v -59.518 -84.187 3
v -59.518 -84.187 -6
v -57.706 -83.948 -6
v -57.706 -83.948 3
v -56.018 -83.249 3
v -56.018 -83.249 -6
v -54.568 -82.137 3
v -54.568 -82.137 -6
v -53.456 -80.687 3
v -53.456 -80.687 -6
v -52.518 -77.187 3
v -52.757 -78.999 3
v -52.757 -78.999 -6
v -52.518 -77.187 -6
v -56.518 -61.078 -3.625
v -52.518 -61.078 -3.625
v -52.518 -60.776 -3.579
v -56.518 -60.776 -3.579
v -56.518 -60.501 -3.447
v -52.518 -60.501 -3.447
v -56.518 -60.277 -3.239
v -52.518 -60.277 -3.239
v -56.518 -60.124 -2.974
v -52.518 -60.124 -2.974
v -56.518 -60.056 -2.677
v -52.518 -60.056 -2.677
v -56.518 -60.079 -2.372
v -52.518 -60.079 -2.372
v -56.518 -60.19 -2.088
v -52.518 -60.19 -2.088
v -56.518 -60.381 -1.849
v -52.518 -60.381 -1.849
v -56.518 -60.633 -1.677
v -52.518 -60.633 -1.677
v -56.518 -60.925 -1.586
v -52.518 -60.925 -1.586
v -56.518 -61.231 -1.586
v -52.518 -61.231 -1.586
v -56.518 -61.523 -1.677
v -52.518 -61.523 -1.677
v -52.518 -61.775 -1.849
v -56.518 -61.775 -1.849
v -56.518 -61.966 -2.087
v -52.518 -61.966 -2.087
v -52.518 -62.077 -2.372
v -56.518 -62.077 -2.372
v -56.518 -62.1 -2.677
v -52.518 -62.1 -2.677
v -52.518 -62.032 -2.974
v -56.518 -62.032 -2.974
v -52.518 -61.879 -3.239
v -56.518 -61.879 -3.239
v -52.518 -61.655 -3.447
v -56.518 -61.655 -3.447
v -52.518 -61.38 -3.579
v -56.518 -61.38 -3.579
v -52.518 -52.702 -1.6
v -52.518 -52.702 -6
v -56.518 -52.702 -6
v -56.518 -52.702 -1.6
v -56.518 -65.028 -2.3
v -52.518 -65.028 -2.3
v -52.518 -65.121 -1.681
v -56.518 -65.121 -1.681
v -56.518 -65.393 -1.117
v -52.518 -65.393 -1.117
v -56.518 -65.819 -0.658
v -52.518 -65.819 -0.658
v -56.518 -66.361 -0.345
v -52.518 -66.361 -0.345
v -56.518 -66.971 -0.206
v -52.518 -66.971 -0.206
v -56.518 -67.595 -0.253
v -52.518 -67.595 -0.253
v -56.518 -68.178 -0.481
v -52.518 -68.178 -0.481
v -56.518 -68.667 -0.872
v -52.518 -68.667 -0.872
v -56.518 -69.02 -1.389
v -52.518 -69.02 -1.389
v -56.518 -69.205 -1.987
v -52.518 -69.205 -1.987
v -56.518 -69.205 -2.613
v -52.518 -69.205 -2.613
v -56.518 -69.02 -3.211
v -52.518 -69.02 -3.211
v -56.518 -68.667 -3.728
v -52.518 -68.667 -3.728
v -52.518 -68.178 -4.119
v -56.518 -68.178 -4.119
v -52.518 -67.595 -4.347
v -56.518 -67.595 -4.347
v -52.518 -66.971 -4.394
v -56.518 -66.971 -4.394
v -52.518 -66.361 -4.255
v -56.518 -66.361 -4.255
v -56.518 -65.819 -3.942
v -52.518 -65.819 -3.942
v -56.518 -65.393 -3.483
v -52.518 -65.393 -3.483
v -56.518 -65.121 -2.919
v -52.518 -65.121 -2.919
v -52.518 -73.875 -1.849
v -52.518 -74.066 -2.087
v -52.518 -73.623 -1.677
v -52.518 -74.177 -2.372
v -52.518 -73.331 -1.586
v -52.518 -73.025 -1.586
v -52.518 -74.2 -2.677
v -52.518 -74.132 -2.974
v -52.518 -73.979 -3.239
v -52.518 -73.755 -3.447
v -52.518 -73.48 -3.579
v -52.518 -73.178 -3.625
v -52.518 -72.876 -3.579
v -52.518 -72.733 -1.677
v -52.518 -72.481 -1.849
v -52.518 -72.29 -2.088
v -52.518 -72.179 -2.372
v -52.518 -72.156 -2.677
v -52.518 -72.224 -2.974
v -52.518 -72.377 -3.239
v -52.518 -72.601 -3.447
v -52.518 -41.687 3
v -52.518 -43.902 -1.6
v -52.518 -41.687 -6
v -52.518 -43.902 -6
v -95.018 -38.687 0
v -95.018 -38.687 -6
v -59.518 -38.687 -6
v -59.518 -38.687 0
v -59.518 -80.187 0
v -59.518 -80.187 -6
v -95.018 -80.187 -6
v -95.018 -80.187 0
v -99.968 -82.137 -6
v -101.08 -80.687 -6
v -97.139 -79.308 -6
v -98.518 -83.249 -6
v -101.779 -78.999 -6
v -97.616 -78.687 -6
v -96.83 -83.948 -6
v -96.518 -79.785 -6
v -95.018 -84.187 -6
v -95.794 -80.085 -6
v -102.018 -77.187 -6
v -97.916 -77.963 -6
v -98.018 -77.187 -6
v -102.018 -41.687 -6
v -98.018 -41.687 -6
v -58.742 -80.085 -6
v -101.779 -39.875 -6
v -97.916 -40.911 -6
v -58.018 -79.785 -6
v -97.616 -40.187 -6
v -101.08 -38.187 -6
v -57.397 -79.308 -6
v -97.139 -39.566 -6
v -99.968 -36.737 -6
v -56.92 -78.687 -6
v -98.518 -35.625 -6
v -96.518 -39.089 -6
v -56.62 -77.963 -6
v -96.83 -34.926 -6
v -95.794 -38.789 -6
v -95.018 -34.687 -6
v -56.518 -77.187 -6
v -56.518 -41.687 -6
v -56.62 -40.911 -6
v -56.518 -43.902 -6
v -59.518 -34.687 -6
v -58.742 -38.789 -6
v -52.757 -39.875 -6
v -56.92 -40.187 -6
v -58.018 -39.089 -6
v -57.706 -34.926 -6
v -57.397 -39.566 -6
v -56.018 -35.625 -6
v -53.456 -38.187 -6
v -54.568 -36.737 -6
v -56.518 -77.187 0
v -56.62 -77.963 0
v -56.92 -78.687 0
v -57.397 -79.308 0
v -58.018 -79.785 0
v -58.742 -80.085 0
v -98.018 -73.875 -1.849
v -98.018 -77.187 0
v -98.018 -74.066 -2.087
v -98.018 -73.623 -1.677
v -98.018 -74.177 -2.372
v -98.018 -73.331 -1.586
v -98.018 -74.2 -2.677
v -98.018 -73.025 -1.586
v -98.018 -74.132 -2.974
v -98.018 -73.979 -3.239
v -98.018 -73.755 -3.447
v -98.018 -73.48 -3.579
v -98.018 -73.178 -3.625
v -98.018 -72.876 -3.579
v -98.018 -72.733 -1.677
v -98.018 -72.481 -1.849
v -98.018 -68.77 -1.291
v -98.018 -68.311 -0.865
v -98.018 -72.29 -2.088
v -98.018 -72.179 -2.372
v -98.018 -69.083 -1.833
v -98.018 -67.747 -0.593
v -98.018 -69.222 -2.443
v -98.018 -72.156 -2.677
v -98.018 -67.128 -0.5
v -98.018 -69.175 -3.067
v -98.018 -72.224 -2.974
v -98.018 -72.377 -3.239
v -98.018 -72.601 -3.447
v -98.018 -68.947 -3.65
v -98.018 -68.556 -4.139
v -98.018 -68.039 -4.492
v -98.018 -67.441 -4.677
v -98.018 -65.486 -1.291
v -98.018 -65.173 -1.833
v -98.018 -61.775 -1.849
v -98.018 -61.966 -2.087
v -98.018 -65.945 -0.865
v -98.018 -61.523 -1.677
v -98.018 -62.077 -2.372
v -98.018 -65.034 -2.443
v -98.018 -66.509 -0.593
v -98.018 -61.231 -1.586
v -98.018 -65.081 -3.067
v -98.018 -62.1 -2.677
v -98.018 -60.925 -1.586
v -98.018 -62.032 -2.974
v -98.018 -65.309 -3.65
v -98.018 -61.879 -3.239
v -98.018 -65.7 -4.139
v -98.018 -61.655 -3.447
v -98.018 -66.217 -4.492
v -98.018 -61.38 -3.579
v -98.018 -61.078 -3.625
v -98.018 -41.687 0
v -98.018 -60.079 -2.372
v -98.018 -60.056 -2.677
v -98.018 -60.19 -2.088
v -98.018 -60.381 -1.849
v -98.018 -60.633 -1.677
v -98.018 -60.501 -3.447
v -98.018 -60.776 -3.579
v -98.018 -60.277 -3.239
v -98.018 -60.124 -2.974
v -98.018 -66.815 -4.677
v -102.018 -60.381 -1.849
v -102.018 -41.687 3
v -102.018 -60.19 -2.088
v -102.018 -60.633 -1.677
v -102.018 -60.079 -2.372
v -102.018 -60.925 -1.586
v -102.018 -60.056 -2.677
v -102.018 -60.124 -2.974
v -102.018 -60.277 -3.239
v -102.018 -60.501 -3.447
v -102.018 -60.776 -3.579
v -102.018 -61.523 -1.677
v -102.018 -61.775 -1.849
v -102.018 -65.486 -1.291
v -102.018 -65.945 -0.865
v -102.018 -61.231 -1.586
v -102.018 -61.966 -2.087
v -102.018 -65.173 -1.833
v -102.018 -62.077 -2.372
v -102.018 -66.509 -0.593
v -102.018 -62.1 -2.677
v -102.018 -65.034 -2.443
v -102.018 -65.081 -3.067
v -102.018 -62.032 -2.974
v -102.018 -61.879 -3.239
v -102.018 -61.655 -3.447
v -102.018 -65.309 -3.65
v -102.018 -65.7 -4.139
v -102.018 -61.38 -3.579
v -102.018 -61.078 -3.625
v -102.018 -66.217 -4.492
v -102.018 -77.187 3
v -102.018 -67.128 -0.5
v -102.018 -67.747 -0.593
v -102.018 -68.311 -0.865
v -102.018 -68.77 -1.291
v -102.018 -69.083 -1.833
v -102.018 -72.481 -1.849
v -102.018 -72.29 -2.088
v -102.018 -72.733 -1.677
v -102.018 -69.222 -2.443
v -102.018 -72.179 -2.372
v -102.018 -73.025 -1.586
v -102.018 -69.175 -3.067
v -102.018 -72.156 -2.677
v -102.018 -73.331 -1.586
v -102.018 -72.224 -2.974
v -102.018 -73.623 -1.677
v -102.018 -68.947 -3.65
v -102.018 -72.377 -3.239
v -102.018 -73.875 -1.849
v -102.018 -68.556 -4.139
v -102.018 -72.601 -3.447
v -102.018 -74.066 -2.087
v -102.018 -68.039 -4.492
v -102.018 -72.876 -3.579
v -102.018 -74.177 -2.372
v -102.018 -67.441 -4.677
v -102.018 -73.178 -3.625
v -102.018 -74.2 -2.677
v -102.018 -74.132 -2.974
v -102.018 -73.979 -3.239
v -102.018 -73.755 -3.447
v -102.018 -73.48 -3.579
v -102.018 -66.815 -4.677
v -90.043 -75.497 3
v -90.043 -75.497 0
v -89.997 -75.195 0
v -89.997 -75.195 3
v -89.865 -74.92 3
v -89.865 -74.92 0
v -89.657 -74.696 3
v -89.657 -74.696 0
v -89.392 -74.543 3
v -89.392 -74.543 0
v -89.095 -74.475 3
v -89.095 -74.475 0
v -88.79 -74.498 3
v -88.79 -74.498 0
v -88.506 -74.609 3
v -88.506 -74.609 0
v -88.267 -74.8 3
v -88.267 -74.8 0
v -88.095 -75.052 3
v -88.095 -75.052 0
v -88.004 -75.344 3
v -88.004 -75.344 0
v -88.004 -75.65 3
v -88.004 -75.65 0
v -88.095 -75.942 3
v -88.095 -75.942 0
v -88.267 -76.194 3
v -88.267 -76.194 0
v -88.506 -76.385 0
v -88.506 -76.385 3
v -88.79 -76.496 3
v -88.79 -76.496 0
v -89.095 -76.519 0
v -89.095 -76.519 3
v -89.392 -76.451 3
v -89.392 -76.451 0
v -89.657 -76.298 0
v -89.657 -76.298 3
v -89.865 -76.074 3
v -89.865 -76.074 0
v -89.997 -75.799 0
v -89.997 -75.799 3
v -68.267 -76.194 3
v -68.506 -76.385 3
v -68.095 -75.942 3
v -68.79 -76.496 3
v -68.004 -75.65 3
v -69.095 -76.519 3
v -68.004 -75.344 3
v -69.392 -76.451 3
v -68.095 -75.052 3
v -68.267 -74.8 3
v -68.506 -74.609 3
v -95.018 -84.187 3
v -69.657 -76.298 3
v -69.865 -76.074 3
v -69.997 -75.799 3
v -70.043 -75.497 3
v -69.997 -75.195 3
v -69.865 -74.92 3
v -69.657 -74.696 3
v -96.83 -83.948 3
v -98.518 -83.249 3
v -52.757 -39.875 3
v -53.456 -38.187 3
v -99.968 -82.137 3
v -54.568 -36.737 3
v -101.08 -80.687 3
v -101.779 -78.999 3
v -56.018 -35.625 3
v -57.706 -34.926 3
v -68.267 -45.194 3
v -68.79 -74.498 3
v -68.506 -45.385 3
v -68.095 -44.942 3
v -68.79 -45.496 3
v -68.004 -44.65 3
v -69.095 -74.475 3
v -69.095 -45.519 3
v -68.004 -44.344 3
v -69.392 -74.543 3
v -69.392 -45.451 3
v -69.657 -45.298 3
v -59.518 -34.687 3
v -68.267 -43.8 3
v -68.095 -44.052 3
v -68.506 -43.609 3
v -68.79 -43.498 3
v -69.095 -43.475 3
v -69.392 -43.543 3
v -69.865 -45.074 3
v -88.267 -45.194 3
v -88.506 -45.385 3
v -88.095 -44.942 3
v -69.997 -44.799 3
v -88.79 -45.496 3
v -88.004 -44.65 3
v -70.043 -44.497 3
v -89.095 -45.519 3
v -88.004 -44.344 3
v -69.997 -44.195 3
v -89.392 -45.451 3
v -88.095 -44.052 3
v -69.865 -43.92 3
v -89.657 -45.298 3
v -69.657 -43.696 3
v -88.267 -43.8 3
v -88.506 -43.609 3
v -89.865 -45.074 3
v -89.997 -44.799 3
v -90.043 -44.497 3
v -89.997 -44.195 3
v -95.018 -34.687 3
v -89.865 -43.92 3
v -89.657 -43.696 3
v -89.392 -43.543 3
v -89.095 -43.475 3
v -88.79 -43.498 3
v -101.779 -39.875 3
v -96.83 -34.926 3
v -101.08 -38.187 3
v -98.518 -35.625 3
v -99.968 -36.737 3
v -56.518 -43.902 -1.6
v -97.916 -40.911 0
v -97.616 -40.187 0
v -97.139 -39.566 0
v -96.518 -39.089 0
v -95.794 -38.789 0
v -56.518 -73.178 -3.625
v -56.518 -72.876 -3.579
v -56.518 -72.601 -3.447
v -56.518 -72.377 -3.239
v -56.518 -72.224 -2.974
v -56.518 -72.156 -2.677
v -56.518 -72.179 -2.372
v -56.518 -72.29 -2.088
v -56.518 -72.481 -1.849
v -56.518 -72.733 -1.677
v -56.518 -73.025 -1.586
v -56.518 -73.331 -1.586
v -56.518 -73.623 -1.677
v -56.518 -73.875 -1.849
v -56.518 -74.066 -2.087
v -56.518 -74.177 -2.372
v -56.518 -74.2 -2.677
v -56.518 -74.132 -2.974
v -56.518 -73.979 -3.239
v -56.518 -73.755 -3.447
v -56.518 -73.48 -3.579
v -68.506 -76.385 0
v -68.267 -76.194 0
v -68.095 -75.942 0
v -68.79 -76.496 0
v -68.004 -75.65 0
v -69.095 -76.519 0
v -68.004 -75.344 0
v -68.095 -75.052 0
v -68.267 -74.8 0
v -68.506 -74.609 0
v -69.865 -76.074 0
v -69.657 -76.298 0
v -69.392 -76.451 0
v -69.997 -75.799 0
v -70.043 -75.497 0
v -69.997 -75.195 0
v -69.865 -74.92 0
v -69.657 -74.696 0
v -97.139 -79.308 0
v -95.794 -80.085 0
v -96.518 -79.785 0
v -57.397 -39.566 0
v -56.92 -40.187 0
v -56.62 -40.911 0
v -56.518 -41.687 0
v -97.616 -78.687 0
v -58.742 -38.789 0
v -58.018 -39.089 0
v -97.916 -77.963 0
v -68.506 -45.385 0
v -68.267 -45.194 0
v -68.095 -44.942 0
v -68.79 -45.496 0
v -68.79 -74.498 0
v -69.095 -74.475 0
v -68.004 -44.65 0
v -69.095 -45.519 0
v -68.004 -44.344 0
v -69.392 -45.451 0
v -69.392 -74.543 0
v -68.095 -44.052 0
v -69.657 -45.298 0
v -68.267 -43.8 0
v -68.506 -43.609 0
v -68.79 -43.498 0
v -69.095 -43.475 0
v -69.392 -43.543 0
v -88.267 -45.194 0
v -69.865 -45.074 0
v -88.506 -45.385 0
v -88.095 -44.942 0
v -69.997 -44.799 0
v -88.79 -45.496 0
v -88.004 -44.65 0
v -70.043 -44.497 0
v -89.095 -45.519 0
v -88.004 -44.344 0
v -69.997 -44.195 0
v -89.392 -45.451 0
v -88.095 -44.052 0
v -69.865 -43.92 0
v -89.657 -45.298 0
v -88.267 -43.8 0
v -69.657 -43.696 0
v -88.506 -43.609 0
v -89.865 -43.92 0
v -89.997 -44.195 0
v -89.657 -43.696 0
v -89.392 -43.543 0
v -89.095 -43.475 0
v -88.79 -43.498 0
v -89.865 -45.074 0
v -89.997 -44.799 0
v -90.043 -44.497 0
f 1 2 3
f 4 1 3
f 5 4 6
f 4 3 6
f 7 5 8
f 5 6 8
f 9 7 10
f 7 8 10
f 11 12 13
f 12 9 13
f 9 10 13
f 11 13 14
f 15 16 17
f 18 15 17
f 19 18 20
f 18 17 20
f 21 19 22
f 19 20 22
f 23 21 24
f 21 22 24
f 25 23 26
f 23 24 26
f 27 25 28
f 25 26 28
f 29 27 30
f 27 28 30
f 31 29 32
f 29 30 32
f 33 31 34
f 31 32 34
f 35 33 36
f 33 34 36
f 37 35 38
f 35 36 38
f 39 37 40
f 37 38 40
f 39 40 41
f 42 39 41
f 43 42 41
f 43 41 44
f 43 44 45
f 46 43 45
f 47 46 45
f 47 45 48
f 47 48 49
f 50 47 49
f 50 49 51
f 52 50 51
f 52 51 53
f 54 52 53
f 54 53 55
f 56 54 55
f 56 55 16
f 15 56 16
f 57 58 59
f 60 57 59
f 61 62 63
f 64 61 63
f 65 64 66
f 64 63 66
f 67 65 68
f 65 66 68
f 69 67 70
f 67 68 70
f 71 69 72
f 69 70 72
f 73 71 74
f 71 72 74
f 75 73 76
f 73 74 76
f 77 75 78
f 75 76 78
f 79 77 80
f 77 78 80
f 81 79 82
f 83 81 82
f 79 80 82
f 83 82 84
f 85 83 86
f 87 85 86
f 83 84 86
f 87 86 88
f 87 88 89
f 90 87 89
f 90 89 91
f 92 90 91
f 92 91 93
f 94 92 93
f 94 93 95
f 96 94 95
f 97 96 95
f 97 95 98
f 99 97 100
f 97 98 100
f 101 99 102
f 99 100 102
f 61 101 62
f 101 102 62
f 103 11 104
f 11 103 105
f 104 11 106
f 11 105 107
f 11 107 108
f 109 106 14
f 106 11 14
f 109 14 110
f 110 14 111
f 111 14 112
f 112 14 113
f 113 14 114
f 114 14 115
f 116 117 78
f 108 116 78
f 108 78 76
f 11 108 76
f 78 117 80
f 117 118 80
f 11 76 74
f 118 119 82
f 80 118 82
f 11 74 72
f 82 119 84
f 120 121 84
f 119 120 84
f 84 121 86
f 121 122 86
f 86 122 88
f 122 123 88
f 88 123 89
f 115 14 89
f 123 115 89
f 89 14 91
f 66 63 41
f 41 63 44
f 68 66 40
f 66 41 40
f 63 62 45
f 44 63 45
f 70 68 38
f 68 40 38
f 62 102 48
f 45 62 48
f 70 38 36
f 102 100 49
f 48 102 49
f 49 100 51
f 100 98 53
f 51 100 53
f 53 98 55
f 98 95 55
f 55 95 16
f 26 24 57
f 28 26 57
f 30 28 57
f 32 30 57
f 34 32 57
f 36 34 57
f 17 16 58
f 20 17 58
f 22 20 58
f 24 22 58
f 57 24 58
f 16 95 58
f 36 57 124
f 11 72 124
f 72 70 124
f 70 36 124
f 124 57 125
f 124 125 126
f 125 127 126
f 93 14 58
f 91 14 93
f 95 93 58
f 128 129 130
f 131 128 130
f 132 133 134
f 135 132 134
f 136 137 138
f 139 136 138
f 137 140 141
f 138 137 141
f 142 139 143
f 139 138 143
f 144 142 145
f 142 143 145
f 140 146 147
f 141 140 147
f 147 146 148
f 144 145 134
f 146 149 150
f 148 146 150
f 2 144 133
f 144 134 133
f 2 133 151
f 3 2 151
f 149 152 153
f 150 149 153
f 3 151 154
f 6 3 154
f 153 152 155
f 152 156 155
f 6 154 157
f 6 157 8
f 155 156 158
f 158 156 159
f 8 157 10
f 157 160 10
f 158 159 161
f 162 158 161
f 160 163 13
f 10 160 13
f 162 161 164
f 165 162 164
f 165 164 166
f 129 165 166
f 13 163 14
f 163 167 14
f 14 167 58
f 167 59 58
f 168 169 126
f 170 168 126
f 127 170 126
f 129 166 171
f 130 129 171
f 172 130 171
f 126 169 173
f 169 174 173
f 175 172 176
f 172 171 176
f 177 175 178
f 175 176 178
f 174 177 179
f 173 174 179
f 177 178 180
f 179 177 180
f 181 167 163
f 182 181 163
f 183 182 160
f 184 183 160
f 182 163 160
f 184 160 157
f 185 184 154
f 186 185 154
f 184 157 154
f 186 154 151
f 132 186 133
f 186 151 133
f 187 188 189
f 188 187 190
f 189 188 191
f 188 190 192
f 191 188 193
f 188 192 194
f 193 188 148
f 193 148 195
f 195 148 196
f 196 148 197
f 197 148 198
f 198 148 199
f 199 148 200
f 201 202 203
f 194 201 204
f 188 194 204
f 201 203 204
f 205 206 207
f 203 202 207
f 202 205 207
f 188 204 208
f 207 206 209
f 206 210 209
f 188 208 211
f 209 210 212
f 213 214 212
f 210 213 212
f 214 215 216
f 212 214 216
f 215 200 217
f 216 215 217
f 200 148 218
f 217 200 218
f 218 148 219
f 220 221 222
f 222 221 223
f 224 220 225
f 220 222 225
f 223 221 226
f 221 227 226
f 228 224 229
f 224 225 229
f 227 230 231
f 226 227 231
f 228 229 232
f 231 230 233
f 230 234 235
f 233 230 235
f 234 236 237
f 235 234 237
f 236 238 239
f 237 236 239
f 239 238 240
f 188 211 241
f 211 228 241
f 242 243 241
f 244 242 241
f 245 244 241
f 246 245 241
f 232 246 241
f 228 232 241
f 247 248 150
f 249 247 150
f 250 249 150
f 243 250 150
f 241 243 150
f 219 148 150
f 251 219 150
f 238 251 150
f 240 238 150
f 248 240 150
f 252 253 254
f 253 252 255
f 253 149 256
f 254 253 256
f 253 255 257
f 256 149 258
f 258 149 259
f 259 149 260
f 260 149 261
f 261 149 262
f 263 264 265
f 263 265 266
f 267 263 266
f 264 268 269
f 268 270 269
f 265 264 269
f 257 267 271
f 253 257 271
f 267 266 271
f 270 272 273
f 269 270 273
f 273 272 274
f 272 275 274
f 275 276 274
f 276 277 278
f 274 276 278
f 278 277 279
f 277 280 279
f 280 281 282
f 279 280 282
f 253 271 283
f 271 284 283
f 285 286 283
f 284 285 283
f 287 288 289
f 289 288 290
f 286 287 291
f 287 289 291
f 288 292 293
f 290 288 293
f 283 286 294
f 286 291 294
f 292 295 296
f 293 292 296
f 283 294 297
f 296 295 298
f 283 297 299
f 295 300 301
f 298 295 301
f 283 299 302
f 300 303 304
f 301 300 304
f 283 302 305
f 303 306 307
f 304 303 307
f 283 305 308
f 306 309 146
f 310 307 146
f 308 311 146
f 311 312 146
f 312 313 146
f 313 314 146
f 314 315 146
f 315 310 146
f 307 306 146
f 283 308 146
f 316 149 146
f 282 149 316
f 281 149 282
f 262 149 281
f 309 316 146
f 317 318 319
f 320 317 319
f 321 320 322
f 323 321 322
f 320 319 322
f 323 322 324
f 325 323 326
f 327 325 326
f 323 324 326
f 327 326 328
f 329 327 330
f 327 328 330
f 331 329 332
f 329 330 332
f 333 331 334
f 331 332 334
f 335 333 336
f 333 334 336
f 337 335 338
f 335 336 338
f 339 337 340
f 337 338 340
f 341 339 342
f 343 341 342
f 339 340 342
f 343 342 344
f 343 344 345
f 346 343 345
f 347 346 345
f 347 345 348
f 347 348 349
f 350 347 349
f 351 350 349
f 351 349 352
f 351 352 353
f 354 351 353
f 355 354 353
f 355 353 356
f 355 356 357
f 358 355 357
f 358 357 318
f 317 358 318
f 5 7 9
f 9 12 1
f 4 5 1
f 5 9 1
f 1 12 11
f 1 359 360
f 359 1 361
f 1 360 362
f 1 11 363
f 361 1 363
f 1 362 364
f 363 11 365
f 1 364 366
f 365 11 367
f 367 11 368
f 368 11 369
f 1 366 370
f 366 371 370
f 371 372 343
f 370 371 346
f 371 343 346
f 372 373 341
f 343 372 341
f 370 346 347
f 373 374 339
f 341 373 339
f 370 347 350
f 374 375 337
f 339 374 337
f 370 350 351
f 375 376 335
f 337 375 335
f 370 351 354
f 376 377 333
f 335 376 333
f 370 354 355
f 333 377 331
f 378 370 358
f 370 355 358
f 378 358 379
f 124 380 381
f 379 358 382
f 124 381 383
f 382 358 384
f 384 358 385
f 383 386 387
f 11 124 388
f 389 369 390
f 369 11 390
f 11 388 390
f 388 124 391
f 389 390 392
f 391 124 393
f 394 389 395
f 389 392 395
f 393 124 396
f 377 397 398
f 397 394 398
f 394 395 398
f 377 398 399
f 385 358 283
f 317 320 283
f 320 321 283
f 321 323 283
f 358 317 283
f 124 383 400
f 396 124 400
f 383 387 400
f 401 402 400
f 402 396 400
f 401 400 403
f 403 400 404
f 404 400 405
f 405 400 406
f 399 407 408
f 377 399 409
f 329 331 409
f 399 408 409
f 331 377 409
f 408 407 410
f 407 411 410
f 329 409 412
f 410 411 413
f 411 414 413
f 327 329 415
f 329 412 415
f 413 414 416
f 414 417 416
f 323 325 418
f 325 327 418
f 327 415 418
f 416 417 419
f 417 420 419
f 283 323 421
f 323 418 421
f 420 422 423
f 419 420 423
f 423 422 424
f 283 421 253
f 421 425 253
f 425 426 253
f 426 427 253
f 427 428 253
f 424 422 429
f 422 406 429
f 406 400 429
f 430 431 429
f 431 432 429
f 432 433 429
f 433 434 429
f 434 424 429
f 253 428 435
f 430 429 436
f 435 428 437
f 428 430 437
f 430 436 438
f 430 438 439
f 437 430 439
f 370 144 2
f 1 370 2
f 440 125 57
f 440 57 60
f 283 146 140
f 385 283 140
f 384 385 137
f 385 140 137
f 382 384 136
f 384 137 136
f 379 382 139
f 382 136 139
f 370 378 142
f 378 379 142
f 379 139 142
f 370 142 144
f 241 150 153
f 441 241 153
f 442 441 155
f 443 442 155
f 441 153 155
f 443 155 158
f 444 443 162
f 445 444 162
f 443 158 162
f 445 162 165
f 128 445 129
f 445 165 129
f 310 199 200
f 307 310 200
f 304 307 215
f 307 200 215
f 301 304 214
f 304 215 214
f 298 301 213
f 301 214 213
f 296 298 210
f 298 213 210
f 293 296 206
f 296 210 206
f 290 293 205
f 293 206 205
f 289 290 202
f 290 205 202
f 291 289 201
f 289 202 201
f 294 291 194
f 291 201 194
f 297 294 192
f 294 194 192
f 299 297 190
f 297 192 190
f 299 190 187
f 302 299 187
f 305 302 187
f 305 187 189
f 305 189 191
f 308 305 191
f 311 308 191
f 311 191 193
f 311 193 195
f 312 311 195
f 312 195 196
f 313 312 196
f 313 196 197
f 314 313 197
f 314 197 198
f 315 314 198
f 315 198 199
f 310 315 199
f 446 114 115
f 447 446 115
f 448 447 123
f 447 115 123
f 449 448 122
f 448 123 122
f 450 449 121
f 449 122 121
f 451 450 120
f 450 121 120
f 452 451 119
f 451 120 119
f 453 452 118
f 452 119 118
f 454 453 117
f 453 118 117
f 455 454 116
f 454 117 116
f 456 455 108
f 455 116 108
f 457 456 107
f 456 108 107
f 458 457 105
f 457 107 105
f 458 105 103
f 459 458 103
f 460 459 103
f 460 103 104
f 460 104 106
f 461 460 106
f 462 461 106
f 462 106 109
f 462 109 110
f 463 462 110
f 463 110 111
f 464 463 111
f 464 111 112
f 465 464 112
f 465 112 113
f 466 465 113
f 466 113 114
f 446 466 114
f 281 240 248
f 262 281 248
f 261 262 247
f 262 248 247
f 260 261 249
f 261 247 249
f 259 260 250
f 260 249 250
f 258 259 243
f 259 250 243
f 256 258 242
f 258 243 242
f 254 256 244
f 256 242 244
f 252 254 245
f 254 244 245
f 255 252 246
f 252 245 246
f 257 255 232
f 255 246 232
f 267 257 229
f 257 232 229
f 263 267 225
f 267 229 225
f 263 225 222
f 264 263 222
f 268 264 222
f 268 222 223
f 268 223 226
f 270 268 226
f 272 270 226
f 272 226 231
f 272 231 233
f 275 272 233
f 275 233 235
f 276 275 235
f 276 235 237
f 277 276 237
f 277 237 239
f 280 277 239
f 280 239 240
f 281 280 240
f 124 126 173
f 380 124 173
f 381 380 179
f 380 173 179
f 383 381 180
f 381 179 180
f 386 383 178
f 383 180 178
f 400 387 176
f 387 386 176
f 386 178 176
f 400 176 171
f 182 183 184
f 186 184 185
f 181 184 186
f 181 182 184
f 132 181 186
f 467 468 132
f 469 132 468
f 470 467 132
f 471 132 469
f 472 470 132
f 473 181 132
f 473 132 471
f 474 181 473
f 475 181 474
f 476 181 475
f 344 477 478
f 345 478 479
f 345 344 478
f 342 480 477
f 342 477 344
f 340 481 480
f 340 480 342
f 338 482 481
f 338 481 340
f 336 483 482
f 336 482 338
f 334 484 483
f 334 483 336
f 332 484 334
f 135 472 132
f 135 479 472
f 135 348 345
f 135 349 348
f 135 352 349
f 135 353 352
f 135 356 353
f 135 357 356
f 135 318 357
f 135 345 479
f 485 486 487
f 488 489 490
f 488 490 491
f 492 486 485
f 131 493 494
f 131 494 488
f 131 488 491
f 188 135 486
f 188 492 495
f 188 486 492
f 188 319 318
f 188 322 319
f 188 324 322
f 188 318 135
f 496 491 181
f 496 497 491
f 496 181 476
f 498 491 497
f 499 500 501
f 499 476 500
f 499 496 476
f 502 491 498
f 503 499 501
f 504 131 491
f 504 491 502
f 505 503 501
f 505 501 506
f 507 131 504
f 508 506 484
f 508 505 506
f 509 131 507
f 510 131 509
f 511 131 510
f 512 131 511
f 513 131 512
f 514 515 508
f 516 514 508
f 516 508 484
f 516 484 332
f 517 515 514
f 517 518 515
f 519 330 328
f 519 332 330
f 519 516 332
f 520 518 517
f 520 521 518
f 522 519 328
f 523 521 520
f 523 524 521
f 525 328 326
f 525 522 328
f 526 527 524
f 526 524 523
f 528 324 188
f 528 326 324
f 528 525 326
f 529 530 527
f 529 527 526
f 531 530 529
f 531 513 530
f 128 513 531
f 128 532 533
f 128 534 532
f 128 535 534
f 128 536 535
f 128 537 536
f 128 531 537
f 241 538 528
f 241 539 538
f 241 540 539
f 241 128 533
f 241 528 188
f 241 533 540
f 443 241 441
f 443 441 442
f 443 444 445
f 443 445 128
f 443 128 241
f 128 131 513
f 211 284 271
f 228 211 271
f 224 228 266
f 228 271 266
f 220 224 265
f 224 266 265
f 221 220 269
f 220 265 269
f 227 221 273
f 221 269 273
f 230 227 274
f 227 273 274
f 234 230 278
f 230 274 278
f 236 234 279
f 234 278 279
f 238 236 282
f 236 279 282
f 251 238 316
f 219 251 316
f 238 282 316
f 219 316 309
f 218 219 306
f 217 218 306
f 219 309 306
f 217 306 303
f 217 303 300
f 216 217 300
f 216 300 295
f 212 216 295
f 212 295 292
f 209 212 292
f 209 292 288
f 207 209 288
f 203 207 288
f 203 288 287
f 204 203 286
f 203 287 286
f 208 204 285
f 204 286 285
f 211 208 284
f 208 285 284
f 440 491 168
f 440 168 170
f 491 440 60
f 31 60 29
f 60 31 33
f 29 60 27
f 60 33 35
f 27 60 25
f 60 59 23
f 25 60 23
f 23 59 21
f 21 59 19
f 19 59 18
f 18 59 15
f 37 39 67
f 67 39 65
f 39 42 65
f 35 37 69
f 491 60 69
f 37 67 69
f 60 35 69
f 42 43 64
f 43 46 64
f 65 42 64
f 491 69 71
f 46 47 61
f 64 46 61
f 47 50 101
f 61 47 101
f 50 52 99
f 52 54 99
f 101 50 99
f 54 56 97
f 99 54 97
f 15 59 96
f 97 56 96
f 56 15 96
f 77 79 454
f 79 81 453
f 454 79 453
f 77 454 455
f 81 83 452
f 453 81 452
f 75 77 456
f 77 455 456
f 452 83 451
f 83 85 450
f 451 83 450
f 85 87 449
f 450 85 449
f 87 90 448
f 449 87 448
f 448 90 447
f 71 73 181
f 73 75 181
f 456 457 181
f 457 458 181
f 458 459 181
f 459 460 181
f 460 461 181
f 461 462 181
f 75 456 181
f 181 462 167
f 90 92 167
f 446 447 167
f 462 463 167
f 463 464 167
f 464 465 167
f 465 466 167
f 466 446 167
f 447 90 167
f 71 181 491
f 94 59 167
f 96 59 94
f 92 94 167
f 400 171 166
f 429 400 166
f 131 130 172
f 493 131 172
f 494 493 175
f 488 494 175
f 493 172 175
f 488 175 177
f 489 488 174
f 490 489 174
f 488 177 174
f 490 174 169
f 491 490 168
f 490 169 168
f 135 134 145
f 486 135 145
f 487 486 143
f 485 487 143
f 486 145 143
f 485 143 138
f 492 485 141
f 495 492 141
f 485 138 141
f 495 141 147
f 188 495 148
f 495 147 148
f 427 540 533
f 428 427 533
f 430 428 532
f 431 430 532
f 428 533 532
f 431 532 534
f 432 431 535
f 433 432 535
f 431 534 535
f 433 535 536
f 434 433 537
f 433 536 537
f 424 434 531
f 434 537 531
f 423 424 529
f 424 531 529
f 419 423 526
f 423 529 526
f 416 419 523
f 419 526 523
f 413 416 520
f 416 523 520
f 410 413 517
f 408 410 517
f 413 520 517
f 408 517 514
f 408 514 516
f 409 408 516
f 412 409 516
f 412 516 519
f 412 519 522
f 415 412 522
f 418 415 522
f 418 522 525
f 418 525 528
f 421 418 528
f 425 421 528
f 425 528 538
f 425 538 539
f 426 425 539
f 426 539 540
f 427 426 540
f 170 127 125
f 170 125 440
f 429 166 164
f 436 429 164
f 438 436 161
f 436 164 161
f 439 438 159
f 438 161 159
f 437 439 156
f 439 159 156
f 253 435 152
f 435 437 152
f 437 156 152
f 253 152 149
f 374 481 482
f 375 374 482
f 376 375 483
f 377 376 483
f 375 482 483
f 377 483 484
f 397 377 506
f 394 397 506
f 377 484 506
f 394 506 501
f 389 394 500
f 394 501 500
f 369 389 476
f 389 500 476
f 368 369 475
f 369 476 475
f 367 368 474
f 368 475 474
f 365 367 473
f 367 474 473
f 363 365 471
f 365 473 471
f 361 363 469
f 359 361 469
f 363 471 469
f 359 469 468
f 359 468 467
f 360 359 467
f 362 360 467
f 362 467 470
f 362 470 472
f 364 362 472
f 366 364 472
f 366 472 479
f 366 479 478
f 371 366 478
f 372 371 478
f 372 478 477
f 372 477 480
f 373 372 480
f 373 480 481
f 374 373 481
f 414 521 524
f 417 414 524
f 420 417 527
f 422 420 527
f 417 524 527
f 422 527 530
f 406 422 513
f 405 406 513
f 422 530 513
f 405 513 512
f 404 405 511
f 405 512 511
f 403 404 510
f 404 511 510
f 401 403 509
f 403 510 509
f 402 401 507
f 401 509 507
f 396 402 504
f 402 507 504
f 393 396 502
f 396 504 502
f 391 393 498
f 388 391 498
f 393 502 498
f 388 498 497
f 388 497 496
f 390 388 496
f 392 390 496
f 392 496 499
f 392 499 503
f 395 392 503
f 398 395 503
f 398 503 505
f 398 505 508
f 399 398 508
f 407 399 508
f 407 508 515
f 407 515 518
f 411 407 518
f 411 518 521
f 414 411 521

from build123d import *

# Parameters (mm, degrees)
EXTRUDE_1_DEPTH     = 3
EXTRUDE_START       = -6
EXTRUDE_2_DEPTH     = 6
SKETCH_2_R          = 2.1
CUT_EXTRUDE_1_DEPTH = 4
SKETCH_3_R          = 2.1
CUT_EXTRUDE_2_DEPTH = 4
M2_5X0_45_1_D       = 2.05
SKETCH_8_W          = 9.616
SKETCH_8_H          = 8.8
CUT_EXTRUDE_3_DEPTH = 4.4
M2_5X0_45_2_D       = 2.05


with BuildPart() as part:
    # 草图1 → 凸台-拉伸1 (new body)
    with BuildSketch(Plane.XY):
        with BuildLine():
            Line((-95.018, -34.687), (-59.518, -34.687))
            ThreePointArc((-59.518, -34.687), (-54.568252532, -36.737252532), (-52.518, -41.687))
            Line((-52.518, -41.687), (-52.518, -77.187))
            ThreePointArc((-52.518, -77.187), (-54.568252532, -82.136747468), (-59.518, -84.187))
            Line((-59.518, -84.187), (-95.018, -84.187))
            ThreePointArc((-95.018, -84.187), (-99.967747468, -82.136747468), (-102.018, -77.187))
            Line((-102.018, -77.187), (-102.018, -41.687))
            ThreePointArc((-102.018, -41.687), (-99.967747468, -36.737252532), (-95.018, -34.687))
        make_face()
    extrude(amount=EXTRUDE_1_DEPTH)

    # 草图1<3> → 凸台-拉伸2 (add)
    with BuildSketch(Plane.XY.offset(EXTRUDE_START)):
        with BuildLine():
            Line((-59.518, -34.687), (-95.018, -34.687))
            ThreePointArc((-95.018, -34.687), (-99.967747468, -36.737252532), (-102.018, -41.687))
            Line((-102.018, -41.687), (-102.018, -77.187))
            ThreePointArc((-102.018, -77.187), (-99.967747468, -82.136747468), (-95.018, -84.187))
            Line((-95.018, -84.187), (-59.518, -84.187))
            ThreePointArc((-59.518, -84.187), (-54.568252532, -82.136747468), (-52.518, -77.187))
            Line((-52.518, -77.187), (-52.518, -41.687))
            ThreePointArc((-52.518, -41.687), (-54.568252532, -36.737252532), (-59.518, -34.687))
        make_face()
        with BuildLine():
            Line((-61.517999092, -80.187), (-94.518000908, -80.187))
            Line((-94.518000908, -80.187), (-95.018, -80.187))
            ThreePointArc((-95.018, -80.187), (-97.139320344, -79.308320344), (-98.018, -77.187))
            Line((-98.018, -77.187), (-98.018, -41.687))
            ThreePointArc((-98.018, -41.687), (-97.139320344, -39.565679656), (-95.018, -38.687))
            Line((-95.018, -38.687), (-59.518, -38.687))
            ThreePointArc((-59.518, -38.687), (-57.396679656, -39.565679656), (-56.518, -41.687))
            Line((-56.518, -41.687), (-56.518, -77.187))
            ThreePointArc((-56.518, -77.187), (-57.396679656, -79.308320344), (-59.518, -80.187))
            Line((-59.518, -80.187), (-61.517999092, -80.187))
        make_face(mode=Mode.SUBTRACT)
    extrude(amount=EXTRUDE_2_DEPTH)

    # 草图2 → 切除-拉伸1 (cut)
    with BuildSketch(Plane.ZY.offset(102.018)):
        with Locations((-2.6, -67.128)):
            Circle(SKETCH_2_R)
    extrude(amount=-CUT_EXTRUDE_1_DEPTH, mode=Mode.SUBTRACT)

    # 草图3 → 切除-拉伸2 (cut)
    with BuildSketch(Plane(origin=(-52.518, 0, 0), x_dir=(0, 0, -1), z_dir=(1, 0, 0))):
        with Locations(Location((2.3, -67.128, 0), (0, 0, 90))):
            Circle(SKETCH_3_R)
    extrude(amount=-CUT_EXTRUDE_2_DEPTH, mode=Mode.SUBTRACT)

    # M2.5x0.45 螺纹孔1 (through all)
    with Locations(Plane.ZY.offset(102.018)):
        with Locations((-2.6, -61.078), (-2.6, -73.178)):
            Hole(M2_5X0_45_1_D / 2)

    # 草图8 → 切除-拉伸3 (cut)
    with BuildSketch(Plane(origin=(0, 0, -6), x_dir=(-1, 0, 0), z_dir=(0, 0, -1))):
        with Locations((57.326, -48.302)):
            Rectangle(SKETCH_8_W, SKETCH_8_H)
    extrude(amount=-CUT_EXTRUDE_3_DEPTH, mode=Mode.SUBTRACT)

    # M2.5x0.45 螺纹孔2 (through all)
    with Locations(Plane.XY.offset(3)):
        with Locations((-89.018, -44.497), (-69.018, -44.497), (-69.018, -75.497), (-89.018, -75.497)):
            Hole(M2_5X0_45_2_D / 2)


solid = part.part
